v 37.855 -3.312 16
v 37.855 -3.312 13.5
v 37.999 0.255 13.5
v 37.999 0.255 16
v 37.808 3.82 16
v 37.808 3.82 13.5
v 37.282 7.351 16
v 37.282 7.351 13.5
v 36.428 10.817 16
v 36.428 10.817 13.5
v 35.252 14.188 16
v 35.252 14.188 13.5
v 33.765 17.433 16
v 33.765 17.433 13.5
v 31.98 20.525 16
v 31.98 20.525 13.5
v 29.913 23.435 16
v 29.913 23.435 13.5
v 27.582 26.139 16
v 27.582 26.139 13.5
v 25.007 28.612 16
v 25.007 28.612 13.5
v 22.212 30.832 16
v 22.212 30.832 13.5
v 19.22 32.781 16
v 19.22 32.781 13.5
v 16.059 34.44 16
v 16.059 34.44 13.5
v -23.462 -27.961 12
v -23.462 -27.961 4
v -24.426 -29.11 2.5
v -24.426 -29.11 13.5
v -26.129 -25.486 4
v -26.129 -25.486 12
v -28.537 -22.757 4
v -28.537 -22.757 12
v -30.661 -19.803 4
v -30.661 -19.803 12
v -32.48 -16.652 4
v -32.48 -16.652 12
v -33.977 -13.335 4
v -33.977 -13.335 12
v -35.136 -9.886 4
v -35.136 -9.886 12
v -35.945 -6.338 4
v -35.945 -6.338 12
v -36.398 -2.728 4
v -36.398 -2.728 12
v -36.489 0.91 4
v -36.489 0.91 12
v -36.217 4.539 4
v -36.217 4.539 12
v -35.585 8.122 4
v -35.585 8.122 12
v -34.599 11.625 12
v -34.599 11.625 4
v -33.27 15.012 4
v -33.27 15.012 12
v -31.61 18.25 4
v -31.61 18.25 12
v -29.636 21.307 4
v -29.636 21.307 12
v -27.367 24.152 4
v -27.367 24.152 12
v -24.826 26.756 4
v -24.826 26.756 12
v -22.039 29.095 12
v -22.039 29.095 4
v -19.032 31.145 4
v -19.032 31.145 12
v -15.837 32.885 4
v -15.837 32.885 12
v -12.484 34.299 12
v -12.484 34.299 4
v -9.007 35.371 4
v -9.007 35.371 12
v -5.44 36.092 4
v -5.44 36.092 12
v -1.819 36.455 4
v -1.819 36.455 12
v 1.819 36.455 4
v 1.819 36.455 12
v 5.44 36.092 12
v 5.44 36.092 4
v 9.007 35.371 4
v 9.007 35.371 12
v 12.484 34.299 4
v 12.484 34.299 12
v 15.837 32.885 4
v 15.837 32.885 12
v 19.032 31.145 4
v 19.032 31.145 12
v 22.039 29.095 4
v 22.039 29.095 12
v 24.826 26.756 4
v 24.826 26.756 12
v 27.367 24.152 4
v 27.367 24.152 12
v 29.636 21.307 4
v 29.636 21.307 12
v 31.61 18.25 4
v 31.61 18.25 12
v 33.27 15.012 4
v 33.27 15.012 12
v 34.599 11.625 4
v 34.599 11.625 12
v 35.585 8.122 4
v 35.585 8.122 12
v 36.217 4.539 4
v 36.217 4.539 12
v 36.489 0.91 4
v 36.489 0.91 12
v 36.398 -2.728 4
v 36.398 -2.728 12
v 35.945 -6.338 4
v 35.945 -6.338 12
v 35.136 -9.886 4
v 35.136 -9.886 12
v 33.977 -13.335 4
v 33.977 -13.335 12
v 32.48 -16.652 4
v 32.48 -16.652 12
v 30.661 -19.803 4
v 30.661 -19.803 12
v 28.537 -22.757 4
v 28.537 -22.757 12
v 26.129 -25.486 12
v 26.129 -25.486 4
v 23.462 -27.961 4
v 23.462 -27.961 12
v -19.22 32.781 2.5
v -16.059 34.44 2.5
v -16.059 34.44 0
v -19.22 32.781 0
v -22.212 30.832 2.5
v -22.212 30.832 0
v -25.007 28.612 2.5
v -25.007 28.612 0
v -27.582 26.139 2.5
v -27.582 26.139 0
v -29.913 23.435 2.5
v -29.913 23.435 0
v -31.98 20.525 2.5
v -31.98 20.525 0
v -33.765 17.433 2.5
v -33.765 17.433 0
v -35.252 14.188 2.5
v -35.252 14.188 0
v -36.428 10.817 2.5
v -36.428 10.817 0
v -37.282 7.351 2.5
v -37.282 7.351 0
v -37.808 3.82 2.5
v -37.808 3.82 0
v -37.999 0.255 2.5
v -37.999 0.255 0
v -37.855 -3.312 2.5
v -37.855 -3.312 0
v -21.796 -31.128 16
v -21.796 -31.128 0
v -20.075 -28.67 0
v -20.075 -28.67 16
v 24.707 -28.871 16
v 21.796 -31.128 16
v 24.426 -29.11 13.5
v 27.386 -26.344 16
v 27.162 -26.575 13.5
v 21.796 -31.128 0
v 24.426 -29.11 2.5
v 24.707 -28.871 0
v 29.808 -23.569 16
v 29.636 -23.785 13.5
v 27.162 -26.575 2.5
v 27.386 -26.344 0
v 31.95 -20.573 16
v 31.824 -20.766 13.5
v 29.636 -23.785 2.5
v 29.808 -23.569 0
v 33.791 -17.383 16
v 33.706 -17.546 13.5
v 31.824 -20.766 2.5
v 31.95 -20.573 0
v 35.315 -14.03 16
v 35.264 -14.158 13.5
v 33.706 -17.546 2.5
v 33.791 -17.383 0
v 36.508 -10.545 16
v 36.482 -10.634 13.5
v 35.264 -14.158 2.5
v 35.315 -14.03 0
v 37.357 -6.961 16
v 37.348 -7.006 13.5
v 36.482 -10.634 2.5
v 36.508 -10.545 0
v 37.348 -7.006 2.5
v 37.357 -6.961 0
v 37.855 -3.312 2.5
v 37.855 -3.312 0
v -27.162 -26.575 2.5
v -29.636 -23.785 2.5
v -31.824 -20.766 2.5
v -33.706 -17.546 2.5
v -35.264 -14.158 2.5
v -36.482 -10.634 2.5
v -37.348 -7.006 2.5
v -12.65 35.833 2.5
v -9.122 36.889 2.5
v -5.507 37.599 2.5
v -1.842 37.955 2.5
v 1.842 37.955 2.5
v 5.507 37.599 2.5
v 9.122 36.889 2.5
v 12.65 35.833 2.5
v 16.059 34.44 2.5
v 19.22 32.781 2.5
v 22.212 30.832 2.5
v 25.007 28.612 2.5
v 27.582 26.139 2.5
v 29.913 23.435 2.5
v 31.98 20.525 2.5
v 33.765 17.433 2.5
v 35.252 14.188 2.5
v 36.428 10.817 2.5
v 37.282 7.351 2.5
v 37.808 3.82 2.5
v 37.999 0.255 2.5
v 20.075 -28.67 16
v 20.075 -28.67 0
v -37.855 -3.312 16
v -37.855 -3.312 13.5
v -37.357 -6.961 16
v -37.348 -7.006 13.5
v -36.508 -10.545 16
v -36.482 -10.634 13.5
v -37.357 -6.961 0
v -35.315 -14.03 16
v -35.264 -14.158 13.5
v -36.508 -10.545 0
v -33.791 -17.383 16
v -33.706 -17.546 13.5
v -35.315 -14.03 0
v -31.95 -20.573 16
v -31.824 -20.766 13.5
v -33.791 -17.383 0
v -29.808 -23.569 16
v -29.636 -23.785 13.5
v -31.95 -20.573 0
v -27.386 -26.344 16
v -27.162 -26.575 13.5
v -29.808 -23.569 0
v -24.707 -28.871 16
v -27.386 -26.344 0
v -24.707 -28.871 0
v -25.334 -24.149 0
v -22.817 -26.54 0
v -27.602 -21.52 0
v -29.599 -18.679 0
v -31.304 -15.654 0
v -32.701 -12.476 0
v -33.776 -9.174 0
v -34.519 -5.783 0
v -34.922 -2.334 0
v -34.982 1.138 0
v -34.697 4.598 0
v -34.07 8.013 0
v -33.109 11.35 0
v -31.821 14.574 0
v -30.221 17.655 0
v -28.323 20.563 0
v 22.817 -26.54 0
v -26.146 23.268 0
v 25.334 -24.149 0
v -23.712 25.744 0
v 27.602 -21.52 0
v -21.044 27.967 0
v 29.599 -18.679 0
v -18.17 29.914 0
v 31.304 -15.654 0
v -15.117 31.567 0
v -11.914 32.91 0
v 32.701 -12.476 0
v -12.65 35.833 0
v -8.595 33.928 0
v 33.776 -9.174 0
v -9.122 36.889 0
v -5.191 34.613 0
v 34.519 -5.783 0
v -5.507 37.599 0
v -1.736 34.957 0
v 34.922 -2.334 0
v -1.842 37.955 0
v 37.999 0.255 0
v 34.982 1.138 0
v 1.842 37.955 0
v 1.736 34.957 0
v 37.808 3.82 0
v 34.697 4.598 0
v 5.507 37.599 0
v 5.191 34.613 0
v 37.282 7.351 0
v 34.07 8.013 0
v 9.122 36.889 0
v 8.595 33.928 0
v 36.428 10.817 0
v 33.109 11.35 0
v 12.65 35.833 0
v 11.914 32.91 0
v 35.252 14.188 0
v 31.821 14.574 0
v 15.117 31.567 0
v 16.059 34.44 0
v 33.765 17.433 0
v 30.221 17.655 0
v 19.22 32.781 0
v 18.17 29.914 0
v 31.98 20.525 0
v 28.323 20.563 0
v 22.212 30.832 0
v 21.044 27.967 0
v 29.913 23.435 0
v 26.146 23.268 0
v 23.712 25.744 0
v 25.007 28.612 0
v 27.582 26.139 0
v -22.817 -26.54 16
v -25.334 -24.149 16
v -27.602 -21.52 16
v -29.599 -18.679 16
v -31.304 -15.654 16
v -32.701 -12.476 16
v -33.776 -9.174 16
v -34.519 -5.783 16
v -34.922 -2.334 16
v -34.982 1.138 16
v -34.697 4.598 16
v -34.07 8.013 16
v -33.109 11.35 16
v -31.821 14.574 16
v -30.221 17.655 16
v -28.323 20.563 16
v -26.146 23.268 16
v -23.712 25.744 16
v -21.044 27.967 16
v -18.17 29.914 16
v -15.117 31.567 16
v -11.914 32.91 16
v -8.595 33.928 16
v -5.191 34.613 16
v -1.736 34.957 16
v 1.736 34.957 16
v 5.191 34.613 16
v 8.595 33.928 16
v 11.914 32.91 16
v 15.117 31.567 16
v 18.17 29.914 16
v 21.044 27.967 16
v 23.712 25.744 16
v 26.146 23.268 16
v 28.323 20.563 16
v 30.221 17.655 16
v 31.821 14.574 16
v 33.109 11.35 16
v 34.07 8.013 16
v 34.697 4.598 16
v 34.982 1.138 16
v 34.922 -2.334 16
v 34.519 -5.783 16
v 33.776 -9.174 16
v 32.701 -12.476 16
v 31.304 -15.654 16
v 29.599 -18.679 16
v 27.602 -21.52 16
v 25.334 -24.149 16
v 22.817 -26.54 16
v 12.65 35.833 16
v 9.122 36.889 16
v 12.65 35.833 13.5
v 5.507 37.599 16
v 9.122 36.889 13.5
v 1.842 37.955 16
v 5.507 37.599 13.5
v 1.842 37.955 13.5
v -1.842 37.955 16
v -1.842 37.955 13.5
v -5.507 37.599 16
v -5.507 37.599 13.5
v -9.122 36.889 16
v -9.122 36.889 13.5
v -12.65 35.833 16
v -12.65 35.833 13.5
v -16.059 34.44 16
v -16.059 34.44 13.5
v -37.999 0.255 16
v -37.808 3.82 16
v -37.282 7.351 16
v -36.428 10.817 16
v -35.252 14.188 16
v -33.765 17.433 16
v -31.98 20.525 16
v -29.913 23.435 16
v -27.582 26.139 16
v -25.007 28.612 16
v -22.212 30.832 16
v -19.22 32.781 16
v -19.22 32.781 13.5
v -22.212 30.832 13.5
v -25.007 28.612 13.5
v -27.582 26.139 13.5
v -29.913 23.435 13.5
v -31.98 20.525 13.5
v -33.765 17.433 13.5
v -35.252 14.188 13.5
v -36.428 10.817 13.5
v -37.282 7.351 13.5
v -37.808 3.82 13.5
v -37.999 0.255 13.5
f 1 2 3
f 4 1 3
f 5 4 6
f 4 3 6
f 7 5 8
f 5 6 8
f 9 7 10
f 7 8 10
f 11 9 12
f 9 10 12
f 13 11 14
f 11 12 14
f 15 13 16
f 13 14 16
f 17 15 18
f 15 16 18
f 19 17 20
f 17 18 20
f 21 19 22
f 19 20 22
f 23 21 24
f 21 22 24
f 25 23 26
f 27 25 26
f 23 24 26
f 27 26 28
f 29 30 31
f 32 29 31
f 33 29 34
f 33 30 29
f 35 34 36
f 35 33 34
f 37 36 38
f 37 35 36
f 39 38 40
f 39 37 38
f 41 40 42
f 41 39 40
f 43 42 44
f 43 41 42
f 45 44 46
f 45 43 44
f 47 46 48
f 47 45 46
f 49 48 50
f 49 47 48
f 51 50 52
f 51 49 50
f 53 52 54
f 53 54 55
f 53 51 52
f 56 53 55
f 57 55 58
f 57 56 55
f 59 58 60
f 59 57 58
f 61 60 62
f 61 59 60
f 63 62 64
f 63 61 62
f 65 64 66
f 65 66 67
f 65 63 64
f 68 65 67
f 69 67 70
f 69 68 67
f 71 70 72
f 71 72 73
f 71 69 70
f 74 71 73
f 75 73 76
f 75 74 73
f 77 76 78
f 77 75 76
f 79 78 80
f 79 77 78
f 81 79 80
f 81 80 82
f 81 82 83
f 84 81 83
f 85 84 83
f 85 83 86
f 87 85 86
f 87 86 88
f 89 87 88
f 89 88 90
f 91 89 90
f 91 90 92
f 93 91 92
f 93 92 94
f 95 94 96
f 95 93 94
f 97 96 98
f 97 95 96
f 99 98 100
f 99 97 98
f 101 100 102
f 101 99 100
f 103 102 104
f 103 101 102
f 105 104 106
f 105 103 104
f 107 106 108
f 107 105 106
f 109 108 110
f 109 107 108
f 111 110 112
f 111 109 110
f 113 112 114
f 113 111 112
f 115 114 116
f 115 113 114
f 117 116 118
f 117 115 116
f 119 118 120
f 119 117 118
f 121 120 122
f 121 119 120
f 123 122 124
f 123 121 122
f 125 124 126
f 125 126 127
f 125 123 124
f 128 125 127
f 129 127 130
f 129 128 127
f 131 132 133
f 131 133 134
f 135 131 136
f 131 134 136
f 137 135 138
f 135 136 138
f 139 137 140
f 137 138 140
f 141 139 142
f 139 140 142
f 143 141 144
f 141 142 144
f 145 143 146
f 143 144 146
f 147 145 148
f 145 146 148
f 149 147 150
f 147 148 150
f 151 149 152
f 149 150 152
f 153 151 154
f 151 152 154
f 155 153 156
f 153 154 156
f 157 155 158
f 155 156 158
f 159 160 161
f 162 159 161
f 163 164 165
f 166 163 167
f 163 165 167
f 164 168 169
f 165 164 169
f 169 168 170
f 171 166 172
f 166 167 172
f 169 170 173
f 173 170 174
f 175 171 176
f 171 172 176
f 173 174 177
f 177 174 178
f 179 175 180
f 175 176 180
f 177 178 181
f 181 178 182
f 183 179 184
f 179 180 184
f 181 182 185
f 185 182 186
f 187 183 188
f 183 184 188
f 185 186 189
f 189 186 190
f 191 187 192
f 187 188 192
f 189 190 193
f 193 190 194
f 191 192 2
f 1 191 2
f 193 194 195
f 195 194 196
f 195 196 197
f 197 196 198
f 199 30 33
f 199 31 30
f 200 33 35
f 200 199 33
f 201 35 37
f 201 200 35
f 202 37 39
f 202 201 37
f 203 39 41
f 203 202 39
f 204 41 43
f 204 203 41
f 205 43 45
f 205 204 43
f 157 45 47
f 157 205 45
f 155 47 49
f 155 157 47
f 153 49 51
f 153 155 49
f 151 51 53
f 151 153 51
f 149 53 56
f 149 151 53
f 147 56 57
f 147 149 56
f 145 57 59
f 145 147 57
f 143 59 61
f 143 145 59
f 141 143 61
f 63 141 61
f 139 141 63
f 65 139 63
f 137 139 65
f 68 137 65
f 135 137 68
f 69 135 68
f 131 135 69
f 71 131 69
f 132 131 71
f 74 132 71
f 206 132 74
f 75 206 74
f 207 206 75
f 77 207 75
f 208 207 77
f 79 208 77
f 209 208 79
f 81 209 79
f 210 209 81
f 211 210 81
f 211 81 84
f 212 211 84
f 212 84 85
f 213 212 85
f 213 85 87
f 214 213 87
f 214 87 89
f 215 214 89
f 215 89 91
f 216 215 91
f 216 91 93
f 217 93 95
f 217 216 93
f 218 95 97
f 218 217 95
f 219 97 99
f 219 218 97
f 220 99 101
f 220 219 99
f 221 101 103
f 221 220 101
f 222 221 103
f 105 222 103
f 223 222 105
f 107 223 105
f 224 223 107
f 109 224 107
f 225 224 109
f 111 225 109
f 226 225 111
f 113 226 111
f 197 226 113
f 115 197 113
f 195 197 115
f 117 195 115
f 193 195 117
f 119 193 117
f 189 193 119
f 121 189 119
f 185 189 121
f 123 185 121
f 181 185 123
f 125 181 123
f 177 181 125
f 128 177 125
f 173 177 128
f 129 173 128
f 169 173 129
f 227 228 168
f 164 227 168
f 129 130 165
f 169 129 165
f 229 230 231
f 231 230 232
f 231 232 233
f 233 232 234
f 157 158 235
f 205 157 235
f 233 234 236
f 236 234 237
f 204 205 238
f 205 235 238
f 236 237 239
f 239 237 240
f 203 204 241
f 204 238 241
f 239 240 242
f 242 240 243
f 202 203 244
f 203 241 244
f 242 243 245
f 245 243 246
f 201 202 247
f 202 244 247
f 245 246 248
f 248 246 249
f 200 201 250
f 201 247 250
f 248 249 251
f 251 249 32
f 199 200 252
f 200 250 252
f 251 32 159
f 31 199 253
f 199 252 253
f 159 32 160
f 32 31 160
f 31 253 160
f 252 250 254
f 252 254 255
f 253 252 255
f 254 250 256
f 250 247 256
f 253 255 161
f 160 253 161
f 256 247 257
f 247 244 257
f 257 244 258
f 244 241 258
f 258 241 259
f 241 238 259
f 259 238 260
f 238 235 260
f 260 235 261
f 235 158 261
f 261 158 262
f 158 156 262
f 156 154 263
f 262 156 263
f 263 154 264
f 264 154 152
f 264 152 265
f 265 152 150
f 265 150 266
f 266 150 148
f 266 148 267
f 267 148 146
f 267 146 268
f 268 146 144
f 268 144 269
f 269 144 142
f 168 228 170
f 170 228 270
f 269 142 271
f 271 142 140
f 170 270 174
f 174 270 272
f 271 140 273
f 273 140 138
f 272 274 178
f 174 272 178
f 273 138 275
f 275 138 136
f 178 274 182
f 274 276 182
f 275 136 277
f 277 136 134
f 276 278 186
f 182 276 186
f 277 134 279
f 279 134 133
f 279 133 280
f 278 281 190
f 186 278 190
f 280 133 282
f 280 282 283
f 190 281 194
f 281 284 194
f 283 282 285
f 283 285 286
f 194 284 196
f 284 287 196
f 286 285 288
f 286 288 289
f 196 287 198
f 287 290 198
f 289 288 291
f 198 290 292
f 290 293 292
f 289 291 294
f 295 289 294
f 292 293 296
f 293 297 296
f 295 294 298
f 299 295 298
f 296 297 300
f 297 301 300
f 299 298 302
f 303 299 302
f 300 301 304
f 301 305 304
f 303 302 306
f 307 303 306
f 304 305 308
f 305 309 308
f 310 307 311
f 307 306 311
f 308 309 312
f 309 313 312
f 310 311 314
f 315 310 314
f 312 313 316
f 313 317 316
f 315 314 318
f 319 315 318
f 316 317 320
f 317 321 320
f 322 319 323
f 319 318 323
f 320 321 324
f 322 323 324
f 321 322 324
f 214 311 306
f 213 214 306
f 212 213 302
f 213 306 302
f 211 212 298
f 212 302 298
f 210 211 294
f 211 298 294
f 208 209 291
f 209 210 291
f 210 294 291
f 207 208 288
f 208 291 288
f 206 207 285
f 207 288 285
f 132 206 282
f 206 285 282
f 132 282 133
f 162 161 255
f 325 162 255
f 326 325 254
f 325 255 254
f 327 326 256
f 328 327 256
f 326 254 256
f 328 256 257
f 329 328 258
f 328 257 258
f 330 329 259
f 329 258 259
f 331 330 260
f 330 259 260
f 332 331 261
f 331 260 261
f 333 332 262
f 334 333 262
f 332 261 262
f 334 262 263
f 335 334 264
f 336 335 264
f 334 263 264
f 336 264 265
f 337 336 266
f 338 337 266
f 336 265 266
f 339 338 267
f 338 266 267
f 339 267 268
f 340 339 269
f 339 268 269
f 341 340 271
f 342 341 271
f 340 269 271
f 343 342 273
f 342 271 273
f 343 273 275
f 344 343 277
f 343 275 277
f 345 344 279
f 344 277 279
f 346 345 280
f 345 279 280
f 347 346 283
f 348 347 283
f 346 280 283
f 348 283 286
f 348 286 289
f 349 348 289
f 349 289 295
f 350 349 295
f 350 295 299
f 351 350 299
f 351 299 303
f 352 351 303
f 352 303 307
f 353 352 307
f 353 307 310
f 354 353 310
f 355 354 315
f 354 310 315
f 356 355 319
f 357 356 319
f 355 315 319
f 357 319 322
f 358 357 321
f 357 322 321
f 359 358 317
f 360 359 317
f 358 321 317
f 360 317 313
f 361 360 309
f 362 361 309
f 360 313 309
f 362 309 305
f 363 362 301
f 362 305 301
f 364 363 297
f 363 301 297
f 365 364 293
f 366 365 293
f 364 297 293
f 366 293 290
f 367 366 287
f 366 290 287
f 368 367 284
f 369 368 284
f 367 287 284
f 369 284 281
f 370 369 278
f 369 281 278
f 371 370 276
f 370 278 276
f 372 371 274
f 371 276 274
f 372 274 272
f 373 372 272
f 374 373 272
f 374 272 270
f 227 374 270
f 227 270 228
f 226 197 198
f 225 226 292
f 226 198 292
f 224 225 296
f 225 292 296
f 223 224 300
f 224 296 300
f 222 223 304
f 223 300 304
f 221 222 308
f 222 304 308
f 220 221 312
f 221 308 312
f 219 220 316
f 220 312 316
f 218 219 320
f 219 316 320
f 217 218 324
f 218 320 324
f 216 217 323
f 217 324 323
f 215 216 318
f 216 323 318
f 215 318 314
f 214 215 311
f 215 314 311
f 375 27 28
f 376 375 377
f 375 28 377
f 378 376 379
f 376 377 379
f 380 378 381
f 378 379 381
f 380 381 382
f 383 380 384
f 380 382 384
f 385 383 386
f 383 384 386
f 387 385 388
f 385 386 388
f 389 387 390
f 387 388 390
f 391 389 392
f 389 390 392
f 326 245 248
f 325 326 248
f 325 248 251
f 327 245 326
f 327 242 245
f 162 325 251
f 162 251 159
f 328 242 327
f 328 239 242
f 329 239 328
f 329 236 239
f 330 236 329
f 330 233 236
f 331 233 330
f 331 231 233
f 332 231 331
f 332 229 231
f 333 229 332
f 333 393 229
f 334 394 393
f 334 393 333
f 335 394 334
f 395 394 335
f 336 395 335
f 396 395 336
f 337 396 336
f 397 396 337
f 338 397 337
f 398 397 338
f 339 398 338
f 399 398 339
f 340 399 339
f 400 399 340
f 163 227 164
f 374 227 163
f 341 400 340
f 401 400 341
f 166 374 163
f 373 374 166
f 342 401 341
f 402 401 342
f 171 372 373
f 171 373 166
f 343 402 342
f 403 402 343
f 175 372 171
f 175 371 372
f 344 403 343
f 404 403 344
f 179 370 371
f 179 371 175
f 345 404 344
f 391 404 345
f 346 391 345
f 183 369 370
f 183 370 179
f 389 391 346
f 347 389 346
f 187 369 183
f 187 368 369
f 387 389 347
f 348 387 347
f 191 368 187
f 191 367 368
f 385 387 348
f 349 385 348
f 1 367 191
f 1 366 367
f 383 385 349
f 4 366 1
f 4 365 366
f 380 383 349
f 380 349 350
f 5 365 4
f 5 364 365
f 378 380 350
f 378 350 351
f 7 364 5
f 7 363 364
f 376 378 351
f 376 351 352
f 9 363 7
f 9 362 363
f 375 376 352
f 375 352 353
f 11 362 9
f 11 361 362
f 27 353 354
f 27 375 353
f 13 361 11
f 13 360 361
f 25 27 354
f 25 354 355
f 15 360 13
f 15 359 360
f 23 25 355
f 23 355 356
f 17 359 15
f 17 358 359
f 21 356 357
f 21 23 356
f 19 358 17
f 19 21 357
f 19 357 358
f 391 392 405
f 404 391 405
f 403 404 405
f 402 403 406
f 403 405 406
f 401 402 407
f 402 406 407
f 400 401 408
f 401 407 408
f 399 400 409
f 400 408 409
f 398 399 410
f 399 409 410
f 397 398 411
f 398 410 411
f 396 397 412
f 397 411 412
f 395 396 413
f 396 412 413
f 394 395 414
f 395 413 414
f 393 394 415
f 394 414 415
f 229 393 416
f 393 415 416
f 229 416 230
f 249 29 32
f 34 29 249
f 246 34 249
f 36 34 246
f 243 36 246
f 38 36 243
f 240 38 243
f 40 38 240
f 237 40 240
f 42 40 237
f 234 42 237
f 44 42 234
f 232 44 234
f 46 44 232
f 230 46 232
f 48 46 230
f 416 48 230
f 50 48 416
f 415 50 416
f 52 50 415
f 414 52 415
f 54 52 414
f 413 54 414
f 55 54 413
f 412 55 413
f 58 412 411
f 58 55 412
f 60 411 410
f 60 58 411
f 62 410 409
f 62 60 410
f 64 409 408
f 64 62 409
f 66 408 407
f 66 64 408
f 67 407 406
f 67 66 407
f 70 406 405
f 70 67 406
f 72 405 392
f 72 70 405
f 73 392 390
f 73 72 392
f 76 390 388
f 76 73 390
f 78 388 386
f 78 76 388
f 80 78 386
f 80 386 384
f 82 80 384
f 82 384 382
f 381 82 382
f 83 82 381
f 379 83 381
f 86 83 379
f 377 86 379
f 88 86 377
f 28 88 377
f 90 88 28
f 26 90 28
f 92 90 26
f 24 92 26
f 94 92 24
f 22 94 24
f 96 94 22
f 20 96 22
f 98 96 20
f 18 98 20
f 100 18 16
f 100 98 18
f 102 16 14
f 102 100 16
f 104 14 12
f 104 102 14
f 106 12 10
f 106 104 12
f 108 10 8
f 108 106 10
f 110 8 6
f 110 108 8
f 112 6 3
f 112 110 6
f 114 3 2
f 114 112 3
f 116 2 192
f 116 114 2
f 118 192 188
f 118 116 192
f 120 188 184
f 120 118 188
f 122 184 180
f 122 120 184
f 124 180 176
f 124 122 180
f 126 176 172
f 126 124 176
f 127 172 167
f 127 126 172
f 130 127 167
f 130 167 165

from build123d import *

# Parameters (mm, degrees)
F1_DEPTH      = 16
F4_ANGLE_BACK = 140
F4_ANGLE      = 280


with BuildPart() as f1:
    # F0 (on Top) → F1 (new body)
    with BuildSketch(Plane.XY):
        with BuildLine():
            Line((20.0751752723, -28.6703215501), (21.7959045813, -31.127777683))
            ThreePointArc((21.7959045813, -31.127777683), (32.9089653438, -19), (37.8553985275, -3.3119182244))
            ThreePointArc((37.8553985275, -3.3119182244), (32.9089653438, 19), (16.0594939461, 34.4396959074))
            ThreePointArc((16.0594939461, 34.4396959074), (0, 38), (-16.0594939461, 34.4396959074))
            ThreePointArc((-16.0594939461, 34.4396959074), (-32.9089653438, 19), (-37.8553985275, -3.3119182244))
            ThreePointArc((-37.8553985275, -3.3119182244), (-32.9089653438, -19), (-21.7959045813, -31.127777683))
            Line((-21.7959045813, -31.127777683), (-20.0751752723, -28.6703215501))
            ThreePointArc((-20.0751752723, -28.6703215501), (0, 35), (20.0751752723, -28.6703215501))
        make_face()
    extrude(amount=F1_DEPTH)

    # F3 (on Right) → F4 (revolve, cut)
    with BuildSketch(Plane.YZ, mode=Mode.PRIVATE) as f4_sk:
        Polygon((42.4908541927, 14.641066667), (38, 14.4704658035), (38, 13.5), (36.5, 12), (36.5, 4), (38, 2.5), (38, 0), (42.4908541927, 0), align=None)
    revolve(f4_sk.sketch.rotate(Axis((0, 0, 11.2814381719), (0, 0, -1)), -F4_ANGLE_BACK), axis=Axis((0, 0, 11.2814381719), (0, 0, -1)), revolution_arc=F4_ANGLE, mode=Mode.SUBTRACT)


solid = f1.part
